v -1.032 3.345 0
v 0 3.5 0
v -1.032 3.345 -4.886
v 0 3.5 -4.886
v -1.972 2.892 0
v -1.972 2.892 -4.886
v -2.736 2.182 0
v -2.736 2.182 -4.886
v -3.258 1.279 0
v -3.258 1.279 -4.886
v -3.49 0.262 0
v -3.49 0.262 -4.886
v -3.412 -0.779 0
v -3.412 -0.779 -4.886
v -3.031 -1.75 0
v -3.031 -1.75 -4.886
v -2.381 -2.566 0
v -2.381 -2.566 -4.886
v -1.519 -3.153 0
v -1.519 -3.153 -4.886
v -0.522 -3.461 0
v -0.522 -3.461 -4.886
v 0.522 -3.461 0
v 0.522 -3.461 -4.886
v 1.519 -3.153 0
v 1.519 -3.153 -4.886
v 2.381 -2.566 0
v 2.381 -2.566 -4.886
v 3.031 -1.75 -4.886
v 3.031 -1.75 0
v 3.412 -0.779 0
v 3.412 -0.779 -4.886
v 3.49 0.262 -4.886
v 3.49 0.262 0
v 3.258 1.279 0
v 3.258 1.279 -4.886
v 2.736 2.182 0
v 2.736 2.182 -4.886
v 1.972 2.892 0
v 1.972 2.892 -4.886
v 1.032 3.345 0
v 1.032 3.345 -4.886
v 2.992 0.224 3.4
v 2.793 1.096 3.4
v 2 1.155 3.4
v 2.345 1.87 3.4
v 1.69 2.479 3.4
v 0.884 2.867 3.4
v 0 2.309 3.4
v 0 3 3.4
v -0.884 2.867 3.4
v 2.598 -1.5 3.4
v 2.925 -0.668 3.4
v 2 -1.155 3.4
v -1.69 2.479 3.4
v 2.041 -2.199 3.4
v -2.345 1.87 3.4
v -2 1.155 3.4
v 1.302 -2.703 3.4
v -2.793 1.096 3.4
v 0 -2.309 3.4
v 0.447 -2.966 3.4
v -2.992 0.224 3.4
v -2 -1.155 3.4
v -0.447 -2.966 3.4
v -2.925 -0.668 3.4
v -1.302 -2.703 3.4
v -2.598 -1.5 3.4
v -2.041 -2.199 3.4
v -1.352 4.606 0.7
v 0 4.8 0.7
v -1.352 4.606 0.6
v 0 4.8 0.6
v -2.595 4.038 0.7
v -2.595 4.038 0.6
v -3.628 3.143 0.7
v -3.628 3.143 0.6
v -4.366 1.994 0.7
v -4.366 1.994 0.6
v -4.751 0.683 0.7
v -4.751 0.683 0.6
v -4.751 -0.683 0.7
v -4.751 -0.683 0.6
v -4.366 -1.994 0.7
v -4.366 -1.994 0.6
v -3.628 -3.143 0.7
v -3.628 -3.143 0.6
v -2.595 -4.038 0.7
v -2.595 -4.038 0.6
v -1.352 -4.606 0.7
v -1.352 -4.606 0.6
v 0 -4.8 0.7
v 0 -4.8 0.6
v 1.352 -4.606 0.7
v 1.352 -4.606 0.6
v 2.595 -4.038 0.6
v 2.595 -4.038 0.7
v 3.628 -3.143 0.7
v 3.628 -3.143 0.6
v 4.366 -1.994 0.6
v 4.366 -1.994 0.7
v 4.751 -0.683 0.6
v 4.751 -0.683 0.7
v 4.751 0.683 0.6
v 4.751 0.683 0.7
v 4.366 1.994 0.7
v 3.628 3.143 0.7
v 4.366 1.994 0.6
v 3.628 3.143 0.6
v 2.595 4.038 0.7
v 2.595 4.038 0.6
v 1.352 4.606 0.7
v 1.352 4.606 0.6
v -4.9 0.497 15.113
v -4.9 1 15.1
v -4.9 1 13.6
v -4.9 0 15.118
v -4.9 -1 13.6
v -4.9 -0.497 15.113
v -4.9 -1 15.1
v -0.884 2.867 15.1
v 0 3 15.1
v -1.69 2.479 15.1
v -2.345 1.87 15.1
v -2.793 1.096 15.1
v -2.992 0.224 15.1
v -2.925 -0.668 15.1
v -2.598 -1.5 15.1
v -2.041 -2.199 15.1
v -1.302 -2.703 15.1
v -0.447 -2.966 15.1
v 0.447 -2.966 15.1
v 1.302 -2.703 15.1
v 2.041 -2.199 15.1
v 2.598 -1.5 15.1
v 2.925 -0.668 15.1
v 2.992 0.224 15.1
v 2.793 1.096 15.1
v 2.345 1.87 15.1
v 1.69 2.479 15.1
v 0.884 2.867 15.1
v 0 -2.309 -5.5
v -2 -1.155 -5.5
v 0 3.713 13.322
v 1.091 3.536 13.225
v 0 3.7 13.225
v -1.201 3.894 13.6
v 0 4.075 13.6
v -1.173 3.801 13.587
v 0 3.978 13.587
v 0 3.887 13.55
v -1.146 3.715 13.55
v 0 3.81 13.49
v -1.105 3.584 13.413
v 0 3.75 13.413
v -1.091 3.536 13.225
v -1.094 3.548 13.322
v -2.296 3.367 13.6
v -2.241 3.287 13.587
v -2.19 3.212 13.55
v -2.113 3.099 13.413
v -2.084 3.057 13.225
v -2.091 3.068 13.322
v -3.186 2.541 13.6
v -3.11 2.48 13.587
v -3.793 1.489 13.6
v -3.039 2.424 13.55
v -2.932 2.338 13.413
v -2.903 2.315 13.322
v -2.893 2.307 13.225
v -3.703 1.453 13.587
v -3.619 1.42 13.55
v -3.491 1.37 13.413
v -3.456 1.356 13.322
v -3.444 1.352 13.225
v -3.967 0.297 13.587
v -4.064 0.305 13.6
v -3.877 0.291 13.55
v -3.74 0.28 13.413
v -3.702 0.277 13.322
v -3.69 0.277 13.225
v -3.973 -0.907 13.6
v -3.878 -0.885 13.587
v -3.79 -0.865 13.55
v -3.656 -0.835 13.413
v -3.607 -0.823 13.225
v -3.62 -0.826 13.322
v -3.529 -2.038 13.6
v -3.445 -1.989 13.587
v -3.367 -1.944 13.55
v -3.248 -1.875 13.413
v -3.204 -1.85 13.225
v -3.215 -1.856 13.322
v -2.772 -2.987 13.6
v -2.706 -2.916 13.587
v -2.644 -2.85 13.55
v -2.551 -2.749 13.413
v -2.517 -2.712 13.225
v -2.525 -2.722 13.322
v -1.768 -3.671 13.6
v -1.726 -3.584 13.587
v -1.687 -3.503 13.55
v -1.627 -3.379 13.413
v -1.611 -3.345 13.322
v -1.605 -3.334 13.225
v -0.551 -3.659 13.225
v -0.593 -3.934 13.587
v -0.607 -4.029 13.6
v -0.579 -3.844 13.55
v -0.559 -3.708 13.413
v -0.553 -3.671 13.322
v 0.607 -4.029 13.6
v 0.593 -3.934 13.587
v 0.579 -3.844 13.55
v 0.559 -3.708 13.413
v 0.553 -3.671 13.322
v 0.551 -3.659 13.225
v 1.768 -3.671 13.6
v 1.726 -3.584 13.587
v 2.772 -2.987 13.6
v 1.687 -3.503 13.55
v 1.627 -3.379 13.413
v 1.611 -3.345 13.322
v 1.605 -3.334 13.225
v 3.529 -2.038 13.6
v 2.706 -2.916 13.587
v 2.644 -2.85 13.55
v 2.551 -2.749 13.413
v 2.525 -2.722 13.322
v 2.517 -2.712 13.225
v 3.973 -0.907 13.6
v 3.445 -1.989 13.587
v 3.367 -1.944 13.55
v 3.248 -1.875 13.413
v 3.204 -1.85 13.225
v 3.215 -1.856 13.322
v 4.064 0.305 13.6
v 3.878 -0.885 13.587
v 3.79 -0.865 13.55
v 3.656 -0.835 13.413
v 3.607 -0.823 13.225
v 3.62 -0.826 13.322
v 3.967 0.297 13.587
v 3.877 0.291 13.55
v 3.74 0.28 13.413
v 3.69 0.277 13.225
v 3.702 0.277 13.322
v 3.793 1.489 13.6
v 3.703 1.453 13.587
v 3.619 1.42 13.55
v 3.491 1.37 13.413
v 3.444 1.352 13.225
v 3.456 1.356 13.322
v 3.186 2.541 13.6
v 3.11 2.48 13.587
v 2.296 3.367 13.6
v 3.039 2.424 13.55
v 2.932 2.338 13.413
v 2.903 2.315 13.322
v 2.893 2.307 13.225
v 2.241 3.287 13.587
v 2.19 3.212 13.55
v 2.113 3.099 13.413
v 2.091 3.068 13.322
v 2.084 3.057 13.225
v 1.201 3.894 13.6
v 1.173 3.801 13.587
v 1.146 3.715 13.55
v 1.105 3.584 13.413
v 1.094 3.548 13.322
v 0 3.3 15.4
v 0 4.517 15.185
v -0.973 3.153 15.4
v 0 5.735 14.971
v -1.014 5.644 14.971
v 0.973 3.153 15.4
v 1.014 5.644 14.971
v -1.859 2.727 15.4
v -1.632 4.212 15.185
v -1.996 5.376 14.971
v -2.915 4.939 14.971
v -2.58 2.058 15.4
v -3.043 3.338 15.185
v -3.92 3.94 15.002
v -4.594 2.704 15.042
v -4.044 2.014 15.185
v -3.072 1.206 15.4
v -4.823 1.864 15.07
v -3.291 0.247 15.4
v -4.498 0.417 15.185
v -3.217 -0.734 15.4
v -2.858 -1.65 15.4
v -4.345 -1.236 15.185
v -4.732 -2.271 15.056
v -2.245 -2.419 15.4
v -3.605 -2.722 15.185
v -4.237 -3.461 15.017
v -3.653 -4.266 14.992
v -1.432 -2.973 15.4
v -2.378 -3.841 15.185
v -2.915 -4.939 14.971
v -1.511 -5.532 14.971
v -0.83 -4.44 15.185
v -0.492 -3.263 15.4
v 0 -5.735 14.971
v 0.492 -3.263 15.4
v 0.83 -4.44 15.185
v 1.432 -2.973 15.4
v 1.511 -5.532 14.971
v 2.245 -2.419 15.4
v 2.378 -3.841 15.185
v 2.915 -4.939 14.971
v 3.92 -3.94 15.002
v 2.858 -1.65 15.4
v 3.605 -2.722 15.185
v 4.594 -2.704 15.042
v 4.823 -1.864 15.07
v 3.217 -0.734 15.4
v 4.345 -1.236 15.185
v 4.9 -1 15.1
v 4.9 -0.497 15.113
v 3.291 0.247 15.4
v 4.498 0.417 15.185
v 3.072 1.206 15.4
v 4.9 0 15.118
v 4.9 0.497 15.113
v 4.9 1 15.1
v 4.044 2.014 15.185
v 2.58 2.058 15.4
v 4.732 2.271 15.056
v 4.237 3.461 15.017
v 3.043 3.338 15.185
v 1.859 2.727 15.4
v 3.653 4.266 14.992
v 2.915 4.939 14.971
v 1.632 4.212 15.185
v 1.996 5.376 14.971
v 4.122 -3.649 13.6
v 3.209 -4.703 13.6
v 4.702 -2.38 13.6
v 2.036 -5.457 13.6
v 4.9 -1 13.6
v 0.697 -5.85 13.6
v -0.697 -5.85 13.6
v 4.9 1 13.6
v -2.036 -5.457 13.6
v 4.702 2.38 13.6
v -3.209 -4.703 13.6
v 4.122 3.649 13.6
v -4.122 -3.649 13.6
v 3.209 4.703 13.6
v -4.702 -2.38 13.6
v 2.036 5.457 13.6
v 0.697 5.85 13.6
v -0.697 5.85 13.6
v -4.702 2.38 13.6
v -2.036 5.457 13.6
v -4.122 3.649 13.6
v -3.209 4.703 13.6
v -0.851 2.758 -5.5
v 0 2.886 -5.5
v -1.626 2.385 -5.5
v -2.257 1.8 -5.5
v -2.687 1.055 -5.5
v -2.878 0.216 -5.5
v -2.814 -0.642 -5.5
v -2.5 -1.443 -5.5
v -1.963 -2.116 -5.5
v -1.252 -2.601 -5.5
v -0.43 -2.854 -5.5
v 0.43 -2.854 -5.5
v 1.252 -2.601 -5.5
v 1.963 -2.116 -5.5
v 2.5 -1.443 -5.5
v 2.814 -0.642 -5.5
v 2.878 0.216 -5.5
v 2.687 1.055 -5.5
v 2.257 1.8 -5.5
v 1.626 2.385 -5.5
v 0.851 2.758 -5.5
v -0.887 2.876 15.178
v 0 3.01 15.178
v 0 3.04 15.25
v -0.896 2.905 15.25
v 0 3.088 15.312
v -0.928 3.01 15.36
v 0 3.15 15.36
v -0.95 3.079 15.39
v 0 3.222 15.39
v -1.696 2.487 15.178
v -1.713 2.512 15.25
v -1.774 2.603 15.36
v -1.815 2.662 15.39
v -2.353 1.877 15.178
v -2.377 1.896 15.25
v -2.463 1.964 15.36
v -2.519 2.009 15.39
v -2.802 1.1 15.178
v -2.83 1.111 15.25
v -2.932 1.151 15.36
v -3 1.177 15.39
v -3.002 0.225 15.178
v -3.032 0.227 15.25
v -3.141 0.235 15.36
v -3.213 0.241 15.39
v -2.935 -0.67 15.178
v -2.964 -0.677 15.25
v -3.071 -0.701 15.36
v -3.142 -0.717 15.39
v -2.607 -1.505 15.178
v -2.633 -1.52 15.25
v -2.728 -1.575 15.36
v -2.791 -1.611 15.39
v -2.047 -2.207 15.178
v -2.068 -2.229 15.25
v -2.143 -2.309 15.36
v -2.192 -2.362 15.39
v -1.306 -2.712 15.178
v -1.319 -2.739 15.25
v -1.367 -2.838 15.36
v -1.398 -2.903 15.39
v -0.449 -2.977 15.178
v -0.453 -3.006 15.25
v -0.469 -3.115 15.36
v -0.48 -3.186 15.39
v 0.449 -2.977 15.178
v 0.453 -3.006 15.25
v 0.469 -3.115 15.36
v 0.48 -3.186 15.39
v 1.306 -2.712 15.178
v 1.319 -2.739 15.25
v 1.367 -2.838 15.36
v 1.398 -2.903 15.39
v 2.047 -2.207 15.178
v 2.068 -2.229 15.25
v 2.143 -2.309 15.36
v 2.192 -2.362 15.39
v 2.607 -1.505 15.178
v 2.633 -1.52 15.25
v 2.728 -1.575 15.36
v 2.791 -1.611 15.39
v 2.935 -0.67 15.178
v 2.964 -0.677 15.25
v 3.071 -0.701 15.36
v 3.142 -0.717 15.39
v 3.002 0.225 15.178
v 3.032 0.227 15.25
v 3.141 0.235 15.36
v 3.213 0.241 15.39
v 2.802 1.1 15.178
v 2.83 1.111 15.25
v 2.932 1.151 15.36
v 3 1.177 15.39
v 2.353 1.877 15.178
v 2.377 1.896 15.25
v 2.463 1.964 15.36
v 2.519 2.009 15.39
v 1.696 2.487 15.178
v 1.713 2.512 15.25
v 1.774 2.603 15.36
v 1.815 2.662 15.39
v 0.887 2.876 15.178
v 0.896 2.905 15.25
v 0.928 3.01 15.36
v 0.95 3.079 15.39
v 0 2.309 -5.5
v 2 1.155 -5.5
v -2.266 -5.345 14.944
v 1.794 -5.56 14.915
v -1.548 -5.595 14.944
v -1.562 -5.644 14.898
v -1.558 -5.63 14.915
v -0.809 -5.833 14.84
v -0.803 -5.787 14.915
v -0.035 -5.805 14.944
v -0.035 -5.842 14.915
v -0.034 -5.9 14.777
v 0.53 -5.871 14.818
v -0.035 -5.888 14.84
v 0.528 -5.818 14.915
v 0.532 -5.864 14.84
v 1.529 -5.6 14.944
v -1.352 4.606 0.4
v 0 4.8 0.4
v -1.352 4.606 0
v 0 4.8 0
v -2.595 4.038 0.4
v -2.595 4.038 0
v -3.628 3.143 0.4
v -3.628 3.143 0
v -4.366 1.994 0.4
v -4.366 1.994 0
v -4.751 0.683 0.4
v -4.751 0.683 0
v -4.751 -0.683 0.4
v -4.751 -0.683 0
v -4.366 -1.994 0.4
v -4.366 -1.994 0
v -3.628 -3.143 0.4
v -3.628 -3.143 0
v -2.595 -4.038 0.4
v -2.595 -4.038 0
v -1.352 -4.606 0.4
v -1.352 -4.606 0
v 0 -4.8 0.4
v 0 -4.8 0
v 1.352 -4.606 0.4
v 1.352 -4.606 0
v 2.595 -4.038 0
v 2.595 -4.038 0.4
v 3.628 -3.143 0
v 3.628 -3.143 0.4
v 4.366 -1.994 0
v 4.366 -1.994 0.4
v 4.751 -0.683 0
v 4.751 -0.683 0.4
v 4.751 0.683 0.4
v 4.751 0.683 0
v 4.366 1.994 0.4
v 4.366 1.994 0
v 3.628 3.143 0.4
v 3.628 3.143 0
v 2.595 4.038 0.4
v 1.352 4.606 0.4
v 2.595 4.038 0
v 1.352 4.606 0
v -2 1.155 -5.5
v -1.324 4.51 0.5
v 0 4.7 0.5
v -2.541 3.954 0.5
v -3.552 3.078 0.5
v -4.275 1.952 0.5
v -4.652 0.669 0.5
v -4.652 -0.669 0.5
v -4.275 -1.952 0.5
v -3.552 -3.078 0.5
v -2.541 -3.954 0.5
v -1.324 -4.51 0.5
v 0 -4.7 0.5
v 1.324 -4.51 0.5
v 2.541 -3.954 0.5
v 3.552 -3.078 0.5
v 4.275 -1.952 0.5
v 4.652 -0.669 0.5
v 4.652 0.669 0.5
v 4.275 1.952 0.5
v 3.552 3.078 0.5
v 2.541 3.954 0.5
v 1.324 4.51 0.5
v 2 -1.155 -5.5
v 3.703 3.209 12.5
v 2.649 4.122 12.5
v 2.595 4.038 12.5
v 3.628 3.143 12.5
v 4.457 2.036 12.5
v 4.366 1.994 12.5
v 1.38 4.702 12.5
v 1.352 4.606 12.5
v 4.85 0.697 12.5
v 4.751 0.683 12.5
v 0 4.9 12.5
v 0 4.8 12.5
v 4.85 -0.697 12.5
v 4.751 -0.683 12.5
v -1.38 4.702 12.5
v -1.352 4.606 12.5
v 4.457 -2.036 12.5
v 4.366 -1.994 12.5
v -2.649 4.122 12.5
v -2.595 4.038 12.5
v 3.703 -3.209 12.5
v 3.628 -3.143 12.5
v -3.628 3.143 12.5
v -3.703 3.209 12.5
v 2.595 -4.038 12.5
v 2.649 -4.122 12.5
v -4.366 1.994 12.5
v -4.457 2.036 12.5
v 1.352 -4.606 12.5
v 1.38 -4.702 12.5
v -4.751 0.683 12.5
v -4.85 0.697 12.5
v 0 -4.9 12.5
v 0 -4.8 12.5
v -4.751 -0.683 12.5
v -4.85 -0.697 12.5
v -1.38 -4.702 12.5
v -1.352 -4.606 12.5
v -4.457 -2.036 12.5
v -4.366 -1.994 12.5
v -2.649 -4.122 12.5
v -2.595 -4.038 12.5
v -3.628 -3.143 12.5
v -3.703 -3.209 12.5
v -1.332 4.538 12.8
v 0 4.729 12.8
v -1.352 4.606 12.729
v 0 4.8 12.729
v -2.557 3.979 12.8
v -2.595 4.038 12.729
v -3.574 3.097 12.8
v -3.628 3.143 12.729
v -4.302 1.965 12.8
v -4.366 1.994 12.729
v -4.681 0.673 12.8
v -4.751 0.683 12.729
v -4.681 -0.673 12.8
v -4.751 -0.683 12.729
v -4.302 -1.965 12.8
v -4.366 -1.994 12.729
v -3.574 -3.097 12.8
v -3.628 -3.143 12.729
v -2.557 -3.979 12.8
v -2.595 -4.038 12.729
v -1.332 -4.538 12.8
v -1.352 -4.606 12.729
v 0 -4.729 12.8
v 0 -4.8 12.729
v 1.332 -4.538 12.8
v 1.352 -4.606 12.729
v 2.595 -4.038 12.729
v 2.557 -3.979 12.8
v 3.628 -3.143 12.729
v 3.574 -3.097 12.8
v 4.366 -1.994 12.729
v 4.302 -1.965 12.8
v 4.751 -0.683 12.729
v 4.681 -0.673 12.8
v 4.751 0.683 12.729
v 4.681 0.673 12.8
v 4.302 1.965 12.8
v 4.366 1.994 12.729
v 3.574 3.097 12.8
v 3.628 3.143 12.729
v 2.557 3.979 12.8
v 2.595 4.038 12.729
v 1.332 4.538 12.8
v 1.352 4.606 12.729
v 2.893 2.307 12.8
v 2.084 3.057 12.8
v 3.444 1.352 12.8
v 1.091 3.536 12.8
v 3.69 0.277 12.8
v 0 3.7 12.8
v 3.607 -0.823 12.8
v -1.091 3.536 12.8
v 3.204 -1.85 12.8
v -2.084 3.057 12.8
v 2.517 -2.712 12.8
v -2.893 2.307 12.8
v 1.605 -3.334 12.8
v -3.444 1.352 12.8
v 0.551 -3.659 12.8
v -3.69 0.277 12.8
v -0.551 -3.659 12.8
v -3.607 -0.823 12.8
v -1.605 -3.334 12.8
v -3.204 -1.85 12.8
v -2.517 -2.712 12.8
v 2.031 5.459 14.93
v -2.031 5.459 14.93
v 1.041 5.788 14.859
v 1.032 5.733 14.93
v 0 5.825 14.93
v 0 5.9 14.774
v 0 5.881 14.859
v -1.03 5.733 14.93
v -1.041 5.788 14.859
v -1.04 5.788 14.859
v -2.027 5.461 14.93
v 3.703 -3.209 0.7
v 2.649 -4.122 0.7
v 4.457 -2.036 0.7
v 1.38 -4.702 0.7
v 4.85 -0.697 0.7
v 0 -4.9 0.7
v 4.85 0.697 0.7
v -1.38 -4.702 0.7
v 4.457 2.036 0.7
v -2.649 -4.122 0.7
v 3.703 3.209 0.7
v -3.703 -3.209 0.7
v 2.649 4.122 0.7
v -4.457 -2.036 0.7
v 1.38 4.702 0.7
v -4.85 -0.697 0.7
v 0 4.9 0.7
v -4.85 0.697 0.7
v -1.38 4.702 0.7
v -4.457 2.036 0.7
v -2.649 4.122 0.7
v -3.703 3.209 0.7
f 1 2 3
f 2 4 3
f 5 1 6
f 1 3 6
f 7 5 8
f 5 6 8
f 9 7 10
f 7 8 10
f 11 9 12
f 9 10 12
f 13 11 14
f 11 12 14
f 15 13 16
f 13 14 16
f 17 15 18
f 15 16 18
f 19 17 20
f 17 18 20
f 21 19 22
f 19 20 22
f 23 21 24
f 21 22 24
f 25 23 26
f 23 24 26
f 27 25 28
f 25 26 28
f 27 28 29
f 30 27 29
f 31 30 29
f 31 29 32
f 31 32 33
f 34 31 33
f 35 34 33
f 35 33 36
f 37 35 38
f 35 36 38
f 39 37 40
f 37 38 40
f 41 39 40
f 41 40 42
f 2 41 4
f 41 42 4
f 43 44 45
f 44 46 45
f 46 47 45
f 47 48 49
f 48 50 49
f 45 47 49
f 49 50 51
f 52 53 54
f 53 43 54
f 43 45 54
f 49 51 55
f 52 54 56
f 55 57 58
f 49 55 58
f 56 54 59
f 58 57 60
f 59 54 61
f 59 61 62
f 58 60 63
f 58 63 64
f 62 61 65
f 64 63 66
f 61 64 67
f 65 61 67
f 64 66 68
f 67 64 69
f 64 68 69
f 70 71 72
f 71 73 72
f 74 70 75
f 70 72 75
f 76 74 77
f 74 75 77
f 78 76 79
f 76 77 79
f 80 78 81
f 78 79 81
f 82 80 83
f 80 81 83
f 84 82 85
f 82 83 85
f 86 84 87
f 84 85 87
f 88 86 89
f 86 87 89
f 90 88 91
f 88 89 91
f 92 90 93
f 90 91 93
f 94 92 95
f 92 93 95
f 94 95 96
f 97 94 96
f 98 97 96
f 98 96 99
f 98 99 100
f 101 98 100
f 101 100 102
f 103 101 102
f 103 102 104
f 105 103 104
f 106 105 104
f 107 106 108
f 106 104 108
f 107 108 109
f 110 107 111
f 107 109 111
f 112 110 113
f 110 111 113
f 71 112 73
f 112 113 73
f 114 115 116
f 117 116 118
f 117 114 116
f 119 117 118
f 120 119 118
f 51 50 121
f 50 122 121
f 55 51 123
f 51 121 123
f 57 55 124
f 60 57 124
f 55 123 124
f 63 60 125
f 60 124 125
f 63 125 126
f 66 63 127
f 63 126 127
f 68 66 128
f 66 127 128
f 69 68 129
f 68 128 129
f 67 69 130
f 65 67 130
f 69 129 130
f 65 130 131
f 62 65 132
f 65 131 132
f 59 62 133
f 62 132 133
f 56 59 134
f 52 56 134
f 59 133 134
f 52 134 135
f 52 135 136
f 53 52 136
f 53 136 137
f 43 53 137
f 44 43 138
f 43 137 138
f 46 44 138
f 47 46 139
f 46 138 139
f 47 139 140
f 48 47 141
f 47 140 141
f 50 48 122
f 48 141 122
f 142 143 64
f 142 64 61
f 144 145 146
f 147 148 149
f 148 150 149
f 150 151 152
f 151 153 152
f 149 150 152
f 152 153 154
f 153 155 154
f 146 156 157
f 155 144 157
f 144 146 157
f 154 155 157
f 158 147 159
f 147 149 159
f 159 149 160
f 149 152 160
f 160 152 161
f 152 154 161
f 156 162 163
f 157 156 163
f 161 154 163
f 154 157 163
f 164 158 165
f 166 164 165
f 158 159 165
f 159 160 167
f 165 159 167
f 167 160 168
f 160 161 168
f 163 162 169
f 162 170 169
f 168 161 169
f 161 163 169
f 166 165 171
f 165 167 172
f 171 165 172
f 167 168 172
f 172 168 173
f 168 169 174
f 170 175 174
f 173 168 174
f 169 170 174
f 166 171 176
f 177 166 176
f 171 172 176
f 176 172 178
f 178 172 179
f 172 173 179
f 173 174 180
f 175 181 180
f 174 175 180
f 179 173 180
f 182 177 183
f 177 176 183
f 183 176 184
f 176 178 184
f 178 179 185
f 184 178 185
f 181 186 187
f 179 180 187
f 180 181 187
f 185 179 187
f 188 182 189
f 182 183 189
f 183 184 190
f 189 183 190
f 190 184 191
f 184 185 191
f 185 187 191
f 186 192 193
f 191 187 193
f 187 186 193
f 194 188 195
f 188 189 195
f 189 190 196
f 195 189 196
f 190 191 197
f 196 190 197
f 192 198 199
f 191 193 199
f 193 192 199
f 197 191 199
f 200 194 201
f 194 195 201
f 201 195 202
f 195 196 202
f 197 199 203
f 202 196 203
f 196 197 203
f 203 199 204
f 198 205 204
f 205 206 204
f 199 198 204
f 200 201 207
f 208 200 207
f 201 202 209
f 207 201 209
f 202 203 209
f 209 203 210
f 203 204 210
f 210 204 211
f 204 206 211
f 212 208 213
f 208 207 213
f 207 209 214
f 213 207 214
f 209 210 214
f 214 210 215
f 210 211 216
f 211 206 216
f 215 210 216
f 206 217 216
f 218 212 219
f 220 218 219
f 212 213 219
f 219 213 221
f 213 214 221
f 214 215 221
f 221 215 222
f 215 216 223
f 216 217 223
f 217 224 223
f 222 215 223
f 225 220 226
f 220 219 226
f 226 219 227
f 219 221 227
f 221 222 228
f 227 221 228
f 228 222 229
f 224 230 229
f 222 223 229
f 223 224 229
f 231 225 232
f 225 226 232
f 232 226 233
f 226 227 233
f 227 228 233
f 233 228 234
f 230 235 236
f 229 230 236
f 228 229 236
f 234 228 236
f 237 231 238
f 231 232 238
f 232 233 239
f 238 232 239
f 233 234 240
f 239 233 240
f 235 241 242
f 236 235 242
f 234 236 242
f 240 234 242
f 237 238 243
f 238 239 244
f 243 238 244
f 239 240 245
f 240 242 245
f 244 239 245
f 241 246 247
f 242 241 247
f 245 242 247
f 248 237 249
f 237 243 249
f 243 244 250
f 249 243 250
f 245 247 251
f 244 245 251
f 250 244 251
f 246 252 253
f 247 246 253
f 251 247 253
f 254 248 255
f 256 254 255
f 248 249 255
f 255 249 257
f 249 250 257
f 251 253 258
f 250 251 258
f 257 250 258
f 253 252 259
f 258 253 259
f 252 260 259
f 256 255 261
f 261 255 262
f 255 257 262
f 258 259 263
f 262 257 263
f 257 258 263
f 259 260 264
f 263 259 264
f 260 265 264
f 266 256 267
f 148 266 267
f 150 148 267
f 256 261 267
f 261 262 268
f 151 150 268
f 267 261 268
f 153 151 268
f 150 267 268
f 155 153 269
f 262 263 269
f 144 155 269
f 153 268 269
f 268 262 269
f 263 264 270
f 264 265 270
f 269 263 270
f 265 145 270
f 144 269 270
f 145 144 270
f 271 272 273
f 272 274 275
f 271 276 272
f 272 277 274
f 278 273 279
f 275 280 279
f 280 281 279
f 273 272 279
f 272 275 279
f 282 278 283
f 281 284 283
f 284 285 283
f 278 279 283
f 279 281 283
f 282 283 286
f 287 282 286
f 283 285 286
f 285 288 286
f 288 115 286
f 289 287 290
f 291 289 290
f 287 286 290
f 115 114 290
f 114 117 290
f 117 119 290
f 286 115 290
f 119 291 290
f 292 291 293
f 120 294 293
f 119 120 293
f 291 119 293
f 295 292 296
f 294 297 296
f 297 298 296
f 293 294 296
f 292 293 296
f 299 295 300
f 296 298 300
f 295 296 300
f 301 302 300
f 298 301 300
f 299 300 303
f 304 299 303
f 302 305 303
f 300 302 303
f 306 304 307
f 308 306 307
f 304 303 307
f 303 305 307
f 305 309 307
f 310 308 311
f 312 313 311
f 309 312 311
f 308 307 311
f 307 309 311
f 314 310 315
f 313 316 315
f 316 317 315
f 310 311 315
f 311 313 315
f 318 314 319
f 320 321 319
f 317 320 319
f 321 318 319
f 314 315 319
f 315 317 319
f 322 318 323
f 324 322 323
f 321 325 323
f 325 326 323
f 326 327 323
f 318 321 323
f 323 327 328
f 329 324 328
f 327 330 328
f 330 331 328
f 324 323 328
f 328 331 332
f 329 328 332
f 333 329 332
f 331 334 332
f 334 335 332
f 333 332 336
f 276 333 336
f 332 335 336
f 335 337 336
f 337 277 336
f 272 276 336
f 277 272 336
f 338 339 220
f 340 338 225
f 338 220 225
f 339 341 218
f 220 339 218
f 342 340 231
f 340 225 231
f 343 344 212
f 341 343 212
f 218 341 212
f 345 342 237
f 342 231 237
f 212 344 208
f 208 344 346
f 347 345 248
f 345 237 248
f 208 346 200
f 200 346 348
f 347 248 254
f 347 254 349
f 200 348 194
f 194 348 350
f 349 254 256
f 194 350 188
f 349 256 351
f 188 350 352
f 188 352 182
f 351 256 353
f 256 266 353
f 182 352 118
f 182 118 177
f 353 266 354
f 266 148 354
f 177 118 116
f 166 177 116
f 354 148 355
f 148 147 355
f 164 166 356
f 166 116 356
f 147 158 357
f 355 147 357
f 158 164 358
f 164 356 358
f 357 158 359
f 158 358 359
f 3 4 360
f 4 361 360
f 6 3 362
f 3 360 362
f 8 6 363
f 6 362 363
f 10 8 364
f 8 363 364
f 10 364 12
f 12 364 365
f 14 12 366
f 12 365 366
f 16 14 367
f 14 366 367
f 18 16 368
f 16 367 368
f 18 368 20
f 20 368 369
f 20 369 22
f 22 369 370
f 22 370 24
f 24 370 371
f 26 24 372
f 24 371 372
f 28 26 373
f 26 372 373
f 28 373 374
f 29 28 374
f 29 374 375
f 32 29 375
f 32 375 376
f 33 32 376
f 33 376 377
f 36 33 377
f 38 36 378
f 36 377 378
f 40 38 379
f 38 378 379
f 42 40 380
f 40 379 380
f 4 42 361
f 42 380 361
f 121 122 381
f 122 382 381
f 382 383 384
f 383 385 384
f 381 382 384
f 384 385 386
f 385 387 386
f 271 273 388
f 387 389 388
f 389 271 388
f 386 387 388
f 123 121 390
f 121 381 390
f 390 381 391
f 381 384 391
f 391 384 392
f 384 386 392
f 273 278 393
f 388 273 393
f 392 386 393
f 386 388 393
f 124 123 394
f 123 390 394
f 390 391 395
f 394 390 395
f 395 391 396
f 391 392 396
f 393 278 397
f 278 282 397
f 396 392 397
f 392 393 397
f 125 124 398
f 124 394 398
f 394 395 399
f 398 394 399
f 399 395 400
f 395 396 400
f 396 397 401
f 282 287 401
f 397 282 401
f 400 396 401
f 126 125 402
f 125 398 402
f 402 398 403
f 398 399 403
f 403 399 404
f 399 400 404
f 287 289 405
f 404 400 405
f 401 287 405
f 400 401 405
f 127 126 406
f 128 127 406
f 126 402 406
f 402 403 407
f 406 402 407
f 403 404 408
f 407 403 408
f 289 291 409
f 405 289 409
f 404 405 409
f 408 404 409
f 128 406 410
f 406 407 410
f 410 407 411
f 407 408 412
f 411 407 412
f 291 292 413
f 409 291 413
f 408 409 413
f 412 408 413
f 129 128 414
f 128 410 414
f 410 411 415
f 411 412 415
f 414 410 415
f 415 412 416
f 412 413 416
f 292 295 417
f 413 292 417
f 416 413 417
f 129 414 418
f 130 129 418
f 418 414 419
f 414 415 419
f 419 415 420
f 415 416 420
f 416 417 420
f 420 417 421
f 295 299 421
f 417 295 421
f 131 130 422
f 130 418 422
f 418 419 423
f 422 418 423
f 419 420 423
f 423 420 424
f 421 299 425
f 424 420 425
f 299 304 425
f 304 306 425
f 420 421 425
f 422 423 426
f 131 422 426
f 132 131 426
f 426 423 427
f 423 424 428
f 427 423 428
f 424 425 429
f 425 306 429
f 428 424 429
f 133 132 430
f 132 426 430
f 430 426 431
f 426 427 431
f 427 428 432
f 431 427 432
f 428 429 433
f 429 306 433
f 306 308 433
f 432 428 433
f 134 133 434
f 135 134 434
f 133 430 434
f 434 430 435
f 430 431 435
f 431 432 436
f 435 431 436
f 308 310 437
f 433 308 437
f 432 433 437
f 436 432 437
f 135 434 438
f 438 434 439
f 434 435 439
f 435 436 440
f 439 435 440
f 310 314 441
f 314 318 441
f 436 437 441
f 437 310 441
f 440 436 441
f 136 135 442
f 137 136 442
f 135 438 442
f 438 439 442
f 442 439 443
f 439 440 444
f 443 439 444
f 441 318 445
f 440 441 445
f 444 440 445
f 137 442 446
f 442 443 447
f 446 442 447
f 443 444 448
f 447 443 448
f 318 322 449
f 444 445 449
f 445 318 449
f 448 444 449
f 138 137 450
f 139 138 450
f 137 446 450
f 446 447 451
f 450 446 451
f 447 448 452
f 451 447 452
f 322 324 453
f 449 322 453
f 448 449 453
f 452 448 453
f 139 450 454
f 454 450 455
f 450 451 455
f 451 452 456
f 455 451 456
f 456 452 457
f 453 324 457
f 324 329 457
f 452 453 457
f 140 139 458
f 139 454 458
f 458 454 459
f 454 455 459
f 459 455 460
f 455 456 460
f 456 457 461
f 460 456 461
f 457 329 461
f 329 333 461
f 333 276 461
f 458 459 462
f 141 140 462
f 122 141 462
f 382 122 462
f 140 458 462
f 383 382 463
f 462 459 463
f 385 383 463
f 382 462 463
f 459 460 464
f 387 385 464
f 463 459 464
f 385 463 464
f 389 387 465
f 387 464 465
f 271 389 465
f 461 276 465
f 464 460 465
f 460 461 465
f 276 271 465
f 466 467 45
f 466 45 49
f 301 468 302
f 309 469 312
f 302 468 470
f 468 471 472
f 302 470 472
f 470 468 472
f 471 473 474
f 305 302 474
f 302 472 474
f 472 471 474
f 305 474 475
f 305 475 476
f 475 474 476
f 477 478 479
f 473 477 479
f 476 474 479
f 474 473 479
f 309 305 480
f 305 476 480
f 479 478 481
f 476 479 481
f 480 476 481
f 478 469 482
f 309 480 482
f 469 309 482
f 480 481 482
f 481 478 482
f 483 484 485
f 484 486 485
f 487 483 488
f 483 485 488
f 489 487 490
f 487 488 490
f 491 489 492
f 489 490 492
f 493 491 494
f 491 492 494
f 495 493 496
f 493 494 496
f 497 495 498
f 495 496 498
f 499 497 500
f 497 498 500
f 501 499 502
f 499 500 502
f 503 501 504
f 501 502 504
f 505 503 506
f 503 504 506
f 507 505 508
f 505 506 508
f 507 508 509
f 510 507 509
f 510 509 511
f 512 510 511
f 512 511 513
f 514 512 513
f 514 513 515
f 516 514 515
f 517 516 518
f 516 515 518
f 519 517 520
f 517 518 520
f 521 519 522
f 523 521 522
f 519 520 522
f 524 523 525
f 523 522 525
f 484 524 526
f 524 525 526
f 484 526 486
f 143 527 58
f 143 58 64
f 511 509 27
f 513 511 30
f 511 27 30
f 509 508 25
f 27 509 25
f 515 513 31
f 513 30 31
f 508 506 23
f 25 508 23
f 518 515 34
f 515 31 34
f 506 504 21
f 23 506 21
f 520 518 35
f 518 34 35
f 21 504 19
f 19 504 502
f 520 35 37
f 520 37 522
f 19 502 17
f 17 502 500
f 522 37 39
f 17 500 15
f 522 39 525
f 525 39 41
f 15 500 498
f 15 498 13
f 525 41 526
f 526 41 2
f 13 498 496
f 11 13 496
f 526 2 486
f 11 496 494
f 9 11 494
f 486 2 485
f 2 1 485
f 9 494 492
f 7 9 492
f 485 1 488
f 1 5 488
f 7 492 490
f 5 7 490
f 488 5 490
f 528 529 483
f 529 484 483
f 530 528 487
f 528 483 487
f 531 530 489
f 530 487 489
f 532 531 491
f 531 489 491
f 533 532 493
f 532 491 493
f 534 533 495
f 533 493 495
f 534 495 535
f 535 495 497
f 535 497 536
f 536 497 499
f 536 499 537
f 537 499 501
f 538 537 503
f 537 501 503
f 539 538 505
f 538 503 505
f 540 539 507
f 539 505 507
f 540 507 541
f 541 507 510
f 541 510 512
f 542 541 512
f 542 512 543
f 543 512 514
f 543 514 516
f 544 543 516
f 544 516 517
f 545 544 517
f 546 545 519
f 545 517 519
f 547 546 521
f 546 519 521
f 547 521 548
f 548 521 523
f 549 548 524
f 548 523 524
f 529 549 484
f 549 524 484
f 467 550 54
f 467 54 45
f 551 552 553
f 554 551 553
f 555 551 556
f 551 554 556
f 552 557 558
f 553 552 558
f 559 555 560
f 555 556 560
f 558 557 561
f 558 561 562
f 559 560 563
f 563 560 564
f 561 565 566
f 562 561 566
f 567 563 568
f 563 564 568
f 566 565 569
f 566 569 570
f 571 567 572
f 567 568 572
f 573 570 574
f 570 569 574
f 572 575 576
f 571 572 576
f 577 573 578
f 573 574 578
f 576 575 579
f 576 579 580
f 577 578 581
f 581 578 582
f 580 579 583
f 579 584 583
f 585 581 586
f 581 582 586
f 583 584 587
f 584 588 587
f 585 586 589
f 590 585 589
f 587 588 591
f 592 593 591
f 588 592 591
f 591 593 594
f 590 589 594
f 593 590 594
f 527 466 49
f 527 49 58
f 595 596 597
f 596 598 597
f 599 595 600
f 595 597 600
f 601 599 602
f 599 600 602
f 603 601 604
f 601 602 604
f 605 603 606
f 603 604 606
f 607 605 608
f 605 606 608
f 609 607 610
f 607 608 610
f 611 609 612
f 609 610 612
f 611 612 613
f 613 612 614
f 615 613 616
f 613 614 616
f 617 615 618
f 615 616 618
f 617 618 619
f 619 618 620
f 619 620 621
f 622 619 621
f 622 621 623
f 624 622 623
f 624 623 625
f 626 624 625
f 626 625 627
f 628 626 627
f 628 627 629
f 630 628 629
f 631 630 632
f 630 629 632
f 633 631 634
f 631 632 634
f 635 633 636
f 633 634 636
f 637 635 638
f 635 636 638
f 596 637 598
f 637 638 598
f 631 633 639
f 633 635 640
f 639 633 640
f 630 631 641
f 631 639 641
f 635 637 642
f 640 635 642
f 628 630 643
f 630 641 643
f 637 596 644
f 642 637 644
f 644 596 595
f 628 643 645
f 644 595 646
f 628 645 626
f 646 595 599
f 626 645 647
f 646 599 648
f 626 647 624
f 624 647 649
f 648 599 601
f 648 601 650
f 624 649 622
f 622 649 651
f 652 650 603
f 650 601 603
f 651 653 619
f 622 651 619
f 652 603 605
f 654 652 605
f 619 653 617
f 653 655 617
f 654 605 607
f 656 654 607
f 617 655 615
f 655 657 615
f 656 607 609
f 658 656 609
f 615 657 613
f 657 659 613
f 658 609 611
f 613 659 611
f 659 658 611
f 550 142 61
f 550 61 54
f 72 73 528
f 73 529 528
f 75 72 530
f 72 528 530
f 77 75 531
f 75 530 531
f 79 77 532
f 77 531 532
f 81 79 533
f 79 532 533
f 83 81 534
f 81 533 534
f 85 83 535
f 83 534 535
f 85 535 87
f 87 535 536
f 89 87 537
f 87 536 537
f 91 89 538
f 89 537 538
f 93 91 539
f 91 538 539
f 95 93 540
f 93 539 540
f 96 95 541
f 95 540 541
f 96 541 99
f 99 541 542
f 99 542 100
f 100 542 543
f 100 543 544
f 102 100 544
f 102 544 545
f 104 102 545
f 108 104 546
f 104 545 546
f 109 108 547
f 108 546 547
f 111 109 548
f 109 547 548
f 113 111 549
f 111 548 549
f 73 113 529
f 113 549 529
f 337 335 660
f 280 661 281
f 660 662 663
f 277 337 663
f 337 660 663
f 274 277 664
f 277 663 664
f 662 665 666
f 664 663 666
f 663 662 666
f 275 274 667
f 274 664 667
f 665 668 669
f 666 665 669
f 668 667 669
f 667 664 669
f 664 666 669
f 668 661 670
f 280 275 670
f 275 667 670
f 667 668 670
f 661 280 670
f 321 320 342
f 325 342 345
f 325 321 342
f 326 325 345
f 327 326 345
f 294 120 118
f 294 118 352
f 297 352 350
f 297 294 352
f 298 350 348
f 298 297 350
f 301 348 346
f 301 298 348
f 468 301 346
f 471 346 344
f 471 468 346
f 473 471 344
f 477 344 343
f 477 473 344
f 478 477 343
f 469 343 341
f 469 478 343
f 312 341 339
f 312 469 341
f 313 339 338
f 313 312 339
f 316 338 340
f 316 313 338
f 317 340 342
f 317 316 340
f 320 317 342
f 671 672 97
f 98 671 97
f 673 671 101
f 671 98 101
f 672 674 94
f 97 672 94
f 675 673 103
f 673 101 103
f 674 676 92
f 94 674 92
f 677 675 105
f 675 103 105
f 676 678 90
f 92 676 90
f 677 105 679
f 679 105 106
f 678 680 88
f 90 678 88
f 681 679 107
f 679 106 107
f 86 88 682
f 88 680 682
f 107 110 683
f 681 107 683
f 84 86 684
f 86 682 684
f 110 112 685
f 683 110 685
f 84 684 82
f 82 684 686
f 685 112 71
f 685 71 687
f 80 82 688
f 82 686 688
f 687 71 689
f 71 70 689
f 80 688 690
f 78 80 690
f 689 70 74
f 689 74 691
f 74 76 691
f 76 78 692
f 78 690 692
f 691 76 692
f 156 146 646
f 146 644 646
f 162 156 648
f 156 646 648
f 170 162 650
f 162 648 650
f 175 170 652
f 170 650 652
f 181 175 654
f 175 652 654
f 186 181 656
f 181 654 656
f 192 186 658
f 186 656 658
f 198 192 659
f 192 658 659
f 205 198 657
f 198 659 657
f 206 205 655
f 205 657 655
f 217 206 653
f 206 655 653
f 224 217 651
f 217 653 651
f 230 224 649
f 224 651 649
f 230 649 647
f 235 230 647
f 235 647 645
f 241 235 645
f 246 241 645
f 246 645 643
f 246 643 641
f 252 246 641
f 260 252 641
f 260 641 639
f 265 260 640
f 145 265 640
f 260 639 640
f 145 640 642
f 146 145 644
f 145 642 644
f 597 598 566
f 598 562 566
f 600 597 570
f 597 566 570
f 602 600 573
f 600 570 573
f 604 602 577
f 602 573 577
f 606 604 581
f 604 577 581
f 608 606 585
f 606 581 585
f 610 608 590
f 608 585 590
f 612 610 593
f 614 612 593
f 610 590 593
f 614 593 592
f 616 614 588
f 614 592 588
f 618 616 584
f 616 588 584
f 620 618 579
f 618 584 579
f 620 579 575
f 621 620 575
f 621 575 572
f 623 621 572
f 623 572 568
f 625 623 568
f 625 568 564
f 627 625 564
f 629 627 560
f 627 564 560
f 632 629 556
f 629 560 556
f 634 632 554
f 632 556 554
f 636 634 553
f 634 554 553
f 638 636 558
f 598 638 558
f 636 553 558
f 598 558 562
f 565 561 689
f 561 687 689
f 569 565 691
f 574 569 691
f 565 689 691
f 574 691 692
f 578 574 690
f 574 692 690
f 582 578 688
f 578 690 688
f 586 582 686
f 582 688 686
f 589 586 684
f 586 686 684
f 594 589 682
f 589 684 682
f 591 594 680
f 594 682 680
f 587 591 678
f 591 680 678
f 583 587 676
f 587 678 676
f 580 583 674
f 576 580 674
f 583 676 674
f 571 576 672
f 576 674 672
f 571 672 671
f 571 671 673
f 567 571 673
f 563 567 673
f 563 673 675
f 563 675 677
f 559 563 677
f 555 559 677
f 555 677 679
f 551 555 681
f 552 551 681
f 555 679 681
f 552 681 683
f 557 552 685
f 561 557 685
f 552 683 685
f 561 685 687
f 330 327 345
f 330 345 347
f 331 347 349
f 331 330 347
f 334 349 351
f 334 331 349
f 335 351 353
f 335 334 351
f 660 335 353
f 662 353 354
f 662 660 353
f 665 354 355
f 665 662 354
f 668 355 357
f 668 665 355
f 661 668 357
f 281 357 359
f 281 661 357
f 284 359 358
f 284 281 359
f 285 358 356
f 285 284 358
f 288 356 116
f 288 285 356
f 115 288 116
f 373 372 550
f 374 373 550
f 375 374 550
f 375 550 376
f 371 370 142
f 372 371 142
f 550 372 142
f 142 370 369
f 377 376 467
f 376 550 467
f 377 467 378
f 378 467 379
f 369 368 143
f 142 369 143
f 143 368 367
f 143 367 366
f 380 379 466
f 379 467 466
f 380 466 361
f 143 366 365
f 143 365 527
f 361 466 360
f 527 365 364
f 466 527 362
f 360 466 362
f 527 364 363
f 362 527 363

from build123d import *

# Parameters (mm, degrees)
CUT_EXTRUDE1_DEPTH = 8.9
SKETCH3_W          = 20
SKETCH3_H          = 20
CUT_EXTRUDE2_DEPTH = 2


with BuildPart() as part:
    # Sketch1 → Revolve1 (revolve)
    with BuildSketch(Plane(origin=(0, 0, 0), x_dir=(0, 0, -1), z_dir=(1, 0, 0))):
        with BuildLine():
            Line((-3.4, 0), (-3.4, 3))
            Line((-3.4, 3), (-15.1, 3))
            ThreePointArc((-15.1, 3), (-15.312132034, 3.087867966), (-15.4, 3.3))
            Line((-15.4, 3.3), (-14.970691475, 5.734729636))
            ThreePointArc((-14.970691475, 5.734729636), (-14.902287446, 5.853208889), (-14.773729924, 5.9))
            Line((-14.773729924, 5.9), (-13.6, 5.9))
            Line((-13.6, 5.9), (-13.6, 4.075))
            ThreePointArc((-13.6, 4.075), (-13.490165043, 3.809834957), (-13.225, 3.7))
            Line((-13.225, 3.7), (-12.8, 3.7))
            Line((-12.8, 3.7), (-12.8, 4.729289322))
            Line((-12.8, 4.729289322), (-12.729289322, 4.8))
            Line((-12.729289322, 4.8), (-12.5, 4.8))
            Line((-12.5, 4.8), (-12.5, 4.9))
            Line((-12.5, 4.9), (-0.7, 4.9))
            Line((-0.7, 4.9), (-0.7, 4.8))
            Line((-0.7, 4.8), (-0.6, 4.8))
            Line((-0.6, 4.8), (-0.5, 4.7))
            Line((-0.5, 4.7), (-0.4, 4.8))
            Line((-0.4, 4.8), (0, 4.8))
            Line((0, 4.8), (0, 3.5))
            Line((0, 3.5), (4.8865, 3.5))
            Line((4.8865, 3.5), (5.5, 2.8865))
            Line((5.5, 2.8865), (5.5, 0))
            Line((5.5, 0), (-3.4, 0))
        make_face()
    revolve(axis=Axis((0, 0, -5.5), (0, 0, 1)))

    # Sketch2 → Cut-Extrude1 (cut)
    with BuildSketch(Plane.XY.offset(-5.5)):
        Polygon((-2, -1.154700538), (0, -2.309401077), (2, -1.154700538), (2, 1.154700538), (0, 2.309401077), (-2, 1.154700538), align=None)
    extrude(amount=CUT_EXTRUDE1_DEPTH, mode=Mode.SUBTRACT)

    # Sketch3 → Cut-Extrude2 (cut)
    with BuildSketch(Plane.XY.offset(15.4)):
        Rectangle(SKETCH3_W, SKETCH3_H)
        with BuildLine():
            Line((-4.9, 1), (-4.9, -0.999999812))
            ThreePointArc((-4.9, -0.999999812), (0, -5.899999812), (4.9, -0.999999812))
            Line((4.9, -0.999999812), (4.9, 1))
            ThreePointArc((4.9, 1), (0, 5.9), (-4.9, 1))
        make_face(mode=Mode.SUBTRACT)
    extrude(amount=-CUT_EXTRUDE2_DEPTH, mode=Mode.SUBTRACT)


solid = part.part
